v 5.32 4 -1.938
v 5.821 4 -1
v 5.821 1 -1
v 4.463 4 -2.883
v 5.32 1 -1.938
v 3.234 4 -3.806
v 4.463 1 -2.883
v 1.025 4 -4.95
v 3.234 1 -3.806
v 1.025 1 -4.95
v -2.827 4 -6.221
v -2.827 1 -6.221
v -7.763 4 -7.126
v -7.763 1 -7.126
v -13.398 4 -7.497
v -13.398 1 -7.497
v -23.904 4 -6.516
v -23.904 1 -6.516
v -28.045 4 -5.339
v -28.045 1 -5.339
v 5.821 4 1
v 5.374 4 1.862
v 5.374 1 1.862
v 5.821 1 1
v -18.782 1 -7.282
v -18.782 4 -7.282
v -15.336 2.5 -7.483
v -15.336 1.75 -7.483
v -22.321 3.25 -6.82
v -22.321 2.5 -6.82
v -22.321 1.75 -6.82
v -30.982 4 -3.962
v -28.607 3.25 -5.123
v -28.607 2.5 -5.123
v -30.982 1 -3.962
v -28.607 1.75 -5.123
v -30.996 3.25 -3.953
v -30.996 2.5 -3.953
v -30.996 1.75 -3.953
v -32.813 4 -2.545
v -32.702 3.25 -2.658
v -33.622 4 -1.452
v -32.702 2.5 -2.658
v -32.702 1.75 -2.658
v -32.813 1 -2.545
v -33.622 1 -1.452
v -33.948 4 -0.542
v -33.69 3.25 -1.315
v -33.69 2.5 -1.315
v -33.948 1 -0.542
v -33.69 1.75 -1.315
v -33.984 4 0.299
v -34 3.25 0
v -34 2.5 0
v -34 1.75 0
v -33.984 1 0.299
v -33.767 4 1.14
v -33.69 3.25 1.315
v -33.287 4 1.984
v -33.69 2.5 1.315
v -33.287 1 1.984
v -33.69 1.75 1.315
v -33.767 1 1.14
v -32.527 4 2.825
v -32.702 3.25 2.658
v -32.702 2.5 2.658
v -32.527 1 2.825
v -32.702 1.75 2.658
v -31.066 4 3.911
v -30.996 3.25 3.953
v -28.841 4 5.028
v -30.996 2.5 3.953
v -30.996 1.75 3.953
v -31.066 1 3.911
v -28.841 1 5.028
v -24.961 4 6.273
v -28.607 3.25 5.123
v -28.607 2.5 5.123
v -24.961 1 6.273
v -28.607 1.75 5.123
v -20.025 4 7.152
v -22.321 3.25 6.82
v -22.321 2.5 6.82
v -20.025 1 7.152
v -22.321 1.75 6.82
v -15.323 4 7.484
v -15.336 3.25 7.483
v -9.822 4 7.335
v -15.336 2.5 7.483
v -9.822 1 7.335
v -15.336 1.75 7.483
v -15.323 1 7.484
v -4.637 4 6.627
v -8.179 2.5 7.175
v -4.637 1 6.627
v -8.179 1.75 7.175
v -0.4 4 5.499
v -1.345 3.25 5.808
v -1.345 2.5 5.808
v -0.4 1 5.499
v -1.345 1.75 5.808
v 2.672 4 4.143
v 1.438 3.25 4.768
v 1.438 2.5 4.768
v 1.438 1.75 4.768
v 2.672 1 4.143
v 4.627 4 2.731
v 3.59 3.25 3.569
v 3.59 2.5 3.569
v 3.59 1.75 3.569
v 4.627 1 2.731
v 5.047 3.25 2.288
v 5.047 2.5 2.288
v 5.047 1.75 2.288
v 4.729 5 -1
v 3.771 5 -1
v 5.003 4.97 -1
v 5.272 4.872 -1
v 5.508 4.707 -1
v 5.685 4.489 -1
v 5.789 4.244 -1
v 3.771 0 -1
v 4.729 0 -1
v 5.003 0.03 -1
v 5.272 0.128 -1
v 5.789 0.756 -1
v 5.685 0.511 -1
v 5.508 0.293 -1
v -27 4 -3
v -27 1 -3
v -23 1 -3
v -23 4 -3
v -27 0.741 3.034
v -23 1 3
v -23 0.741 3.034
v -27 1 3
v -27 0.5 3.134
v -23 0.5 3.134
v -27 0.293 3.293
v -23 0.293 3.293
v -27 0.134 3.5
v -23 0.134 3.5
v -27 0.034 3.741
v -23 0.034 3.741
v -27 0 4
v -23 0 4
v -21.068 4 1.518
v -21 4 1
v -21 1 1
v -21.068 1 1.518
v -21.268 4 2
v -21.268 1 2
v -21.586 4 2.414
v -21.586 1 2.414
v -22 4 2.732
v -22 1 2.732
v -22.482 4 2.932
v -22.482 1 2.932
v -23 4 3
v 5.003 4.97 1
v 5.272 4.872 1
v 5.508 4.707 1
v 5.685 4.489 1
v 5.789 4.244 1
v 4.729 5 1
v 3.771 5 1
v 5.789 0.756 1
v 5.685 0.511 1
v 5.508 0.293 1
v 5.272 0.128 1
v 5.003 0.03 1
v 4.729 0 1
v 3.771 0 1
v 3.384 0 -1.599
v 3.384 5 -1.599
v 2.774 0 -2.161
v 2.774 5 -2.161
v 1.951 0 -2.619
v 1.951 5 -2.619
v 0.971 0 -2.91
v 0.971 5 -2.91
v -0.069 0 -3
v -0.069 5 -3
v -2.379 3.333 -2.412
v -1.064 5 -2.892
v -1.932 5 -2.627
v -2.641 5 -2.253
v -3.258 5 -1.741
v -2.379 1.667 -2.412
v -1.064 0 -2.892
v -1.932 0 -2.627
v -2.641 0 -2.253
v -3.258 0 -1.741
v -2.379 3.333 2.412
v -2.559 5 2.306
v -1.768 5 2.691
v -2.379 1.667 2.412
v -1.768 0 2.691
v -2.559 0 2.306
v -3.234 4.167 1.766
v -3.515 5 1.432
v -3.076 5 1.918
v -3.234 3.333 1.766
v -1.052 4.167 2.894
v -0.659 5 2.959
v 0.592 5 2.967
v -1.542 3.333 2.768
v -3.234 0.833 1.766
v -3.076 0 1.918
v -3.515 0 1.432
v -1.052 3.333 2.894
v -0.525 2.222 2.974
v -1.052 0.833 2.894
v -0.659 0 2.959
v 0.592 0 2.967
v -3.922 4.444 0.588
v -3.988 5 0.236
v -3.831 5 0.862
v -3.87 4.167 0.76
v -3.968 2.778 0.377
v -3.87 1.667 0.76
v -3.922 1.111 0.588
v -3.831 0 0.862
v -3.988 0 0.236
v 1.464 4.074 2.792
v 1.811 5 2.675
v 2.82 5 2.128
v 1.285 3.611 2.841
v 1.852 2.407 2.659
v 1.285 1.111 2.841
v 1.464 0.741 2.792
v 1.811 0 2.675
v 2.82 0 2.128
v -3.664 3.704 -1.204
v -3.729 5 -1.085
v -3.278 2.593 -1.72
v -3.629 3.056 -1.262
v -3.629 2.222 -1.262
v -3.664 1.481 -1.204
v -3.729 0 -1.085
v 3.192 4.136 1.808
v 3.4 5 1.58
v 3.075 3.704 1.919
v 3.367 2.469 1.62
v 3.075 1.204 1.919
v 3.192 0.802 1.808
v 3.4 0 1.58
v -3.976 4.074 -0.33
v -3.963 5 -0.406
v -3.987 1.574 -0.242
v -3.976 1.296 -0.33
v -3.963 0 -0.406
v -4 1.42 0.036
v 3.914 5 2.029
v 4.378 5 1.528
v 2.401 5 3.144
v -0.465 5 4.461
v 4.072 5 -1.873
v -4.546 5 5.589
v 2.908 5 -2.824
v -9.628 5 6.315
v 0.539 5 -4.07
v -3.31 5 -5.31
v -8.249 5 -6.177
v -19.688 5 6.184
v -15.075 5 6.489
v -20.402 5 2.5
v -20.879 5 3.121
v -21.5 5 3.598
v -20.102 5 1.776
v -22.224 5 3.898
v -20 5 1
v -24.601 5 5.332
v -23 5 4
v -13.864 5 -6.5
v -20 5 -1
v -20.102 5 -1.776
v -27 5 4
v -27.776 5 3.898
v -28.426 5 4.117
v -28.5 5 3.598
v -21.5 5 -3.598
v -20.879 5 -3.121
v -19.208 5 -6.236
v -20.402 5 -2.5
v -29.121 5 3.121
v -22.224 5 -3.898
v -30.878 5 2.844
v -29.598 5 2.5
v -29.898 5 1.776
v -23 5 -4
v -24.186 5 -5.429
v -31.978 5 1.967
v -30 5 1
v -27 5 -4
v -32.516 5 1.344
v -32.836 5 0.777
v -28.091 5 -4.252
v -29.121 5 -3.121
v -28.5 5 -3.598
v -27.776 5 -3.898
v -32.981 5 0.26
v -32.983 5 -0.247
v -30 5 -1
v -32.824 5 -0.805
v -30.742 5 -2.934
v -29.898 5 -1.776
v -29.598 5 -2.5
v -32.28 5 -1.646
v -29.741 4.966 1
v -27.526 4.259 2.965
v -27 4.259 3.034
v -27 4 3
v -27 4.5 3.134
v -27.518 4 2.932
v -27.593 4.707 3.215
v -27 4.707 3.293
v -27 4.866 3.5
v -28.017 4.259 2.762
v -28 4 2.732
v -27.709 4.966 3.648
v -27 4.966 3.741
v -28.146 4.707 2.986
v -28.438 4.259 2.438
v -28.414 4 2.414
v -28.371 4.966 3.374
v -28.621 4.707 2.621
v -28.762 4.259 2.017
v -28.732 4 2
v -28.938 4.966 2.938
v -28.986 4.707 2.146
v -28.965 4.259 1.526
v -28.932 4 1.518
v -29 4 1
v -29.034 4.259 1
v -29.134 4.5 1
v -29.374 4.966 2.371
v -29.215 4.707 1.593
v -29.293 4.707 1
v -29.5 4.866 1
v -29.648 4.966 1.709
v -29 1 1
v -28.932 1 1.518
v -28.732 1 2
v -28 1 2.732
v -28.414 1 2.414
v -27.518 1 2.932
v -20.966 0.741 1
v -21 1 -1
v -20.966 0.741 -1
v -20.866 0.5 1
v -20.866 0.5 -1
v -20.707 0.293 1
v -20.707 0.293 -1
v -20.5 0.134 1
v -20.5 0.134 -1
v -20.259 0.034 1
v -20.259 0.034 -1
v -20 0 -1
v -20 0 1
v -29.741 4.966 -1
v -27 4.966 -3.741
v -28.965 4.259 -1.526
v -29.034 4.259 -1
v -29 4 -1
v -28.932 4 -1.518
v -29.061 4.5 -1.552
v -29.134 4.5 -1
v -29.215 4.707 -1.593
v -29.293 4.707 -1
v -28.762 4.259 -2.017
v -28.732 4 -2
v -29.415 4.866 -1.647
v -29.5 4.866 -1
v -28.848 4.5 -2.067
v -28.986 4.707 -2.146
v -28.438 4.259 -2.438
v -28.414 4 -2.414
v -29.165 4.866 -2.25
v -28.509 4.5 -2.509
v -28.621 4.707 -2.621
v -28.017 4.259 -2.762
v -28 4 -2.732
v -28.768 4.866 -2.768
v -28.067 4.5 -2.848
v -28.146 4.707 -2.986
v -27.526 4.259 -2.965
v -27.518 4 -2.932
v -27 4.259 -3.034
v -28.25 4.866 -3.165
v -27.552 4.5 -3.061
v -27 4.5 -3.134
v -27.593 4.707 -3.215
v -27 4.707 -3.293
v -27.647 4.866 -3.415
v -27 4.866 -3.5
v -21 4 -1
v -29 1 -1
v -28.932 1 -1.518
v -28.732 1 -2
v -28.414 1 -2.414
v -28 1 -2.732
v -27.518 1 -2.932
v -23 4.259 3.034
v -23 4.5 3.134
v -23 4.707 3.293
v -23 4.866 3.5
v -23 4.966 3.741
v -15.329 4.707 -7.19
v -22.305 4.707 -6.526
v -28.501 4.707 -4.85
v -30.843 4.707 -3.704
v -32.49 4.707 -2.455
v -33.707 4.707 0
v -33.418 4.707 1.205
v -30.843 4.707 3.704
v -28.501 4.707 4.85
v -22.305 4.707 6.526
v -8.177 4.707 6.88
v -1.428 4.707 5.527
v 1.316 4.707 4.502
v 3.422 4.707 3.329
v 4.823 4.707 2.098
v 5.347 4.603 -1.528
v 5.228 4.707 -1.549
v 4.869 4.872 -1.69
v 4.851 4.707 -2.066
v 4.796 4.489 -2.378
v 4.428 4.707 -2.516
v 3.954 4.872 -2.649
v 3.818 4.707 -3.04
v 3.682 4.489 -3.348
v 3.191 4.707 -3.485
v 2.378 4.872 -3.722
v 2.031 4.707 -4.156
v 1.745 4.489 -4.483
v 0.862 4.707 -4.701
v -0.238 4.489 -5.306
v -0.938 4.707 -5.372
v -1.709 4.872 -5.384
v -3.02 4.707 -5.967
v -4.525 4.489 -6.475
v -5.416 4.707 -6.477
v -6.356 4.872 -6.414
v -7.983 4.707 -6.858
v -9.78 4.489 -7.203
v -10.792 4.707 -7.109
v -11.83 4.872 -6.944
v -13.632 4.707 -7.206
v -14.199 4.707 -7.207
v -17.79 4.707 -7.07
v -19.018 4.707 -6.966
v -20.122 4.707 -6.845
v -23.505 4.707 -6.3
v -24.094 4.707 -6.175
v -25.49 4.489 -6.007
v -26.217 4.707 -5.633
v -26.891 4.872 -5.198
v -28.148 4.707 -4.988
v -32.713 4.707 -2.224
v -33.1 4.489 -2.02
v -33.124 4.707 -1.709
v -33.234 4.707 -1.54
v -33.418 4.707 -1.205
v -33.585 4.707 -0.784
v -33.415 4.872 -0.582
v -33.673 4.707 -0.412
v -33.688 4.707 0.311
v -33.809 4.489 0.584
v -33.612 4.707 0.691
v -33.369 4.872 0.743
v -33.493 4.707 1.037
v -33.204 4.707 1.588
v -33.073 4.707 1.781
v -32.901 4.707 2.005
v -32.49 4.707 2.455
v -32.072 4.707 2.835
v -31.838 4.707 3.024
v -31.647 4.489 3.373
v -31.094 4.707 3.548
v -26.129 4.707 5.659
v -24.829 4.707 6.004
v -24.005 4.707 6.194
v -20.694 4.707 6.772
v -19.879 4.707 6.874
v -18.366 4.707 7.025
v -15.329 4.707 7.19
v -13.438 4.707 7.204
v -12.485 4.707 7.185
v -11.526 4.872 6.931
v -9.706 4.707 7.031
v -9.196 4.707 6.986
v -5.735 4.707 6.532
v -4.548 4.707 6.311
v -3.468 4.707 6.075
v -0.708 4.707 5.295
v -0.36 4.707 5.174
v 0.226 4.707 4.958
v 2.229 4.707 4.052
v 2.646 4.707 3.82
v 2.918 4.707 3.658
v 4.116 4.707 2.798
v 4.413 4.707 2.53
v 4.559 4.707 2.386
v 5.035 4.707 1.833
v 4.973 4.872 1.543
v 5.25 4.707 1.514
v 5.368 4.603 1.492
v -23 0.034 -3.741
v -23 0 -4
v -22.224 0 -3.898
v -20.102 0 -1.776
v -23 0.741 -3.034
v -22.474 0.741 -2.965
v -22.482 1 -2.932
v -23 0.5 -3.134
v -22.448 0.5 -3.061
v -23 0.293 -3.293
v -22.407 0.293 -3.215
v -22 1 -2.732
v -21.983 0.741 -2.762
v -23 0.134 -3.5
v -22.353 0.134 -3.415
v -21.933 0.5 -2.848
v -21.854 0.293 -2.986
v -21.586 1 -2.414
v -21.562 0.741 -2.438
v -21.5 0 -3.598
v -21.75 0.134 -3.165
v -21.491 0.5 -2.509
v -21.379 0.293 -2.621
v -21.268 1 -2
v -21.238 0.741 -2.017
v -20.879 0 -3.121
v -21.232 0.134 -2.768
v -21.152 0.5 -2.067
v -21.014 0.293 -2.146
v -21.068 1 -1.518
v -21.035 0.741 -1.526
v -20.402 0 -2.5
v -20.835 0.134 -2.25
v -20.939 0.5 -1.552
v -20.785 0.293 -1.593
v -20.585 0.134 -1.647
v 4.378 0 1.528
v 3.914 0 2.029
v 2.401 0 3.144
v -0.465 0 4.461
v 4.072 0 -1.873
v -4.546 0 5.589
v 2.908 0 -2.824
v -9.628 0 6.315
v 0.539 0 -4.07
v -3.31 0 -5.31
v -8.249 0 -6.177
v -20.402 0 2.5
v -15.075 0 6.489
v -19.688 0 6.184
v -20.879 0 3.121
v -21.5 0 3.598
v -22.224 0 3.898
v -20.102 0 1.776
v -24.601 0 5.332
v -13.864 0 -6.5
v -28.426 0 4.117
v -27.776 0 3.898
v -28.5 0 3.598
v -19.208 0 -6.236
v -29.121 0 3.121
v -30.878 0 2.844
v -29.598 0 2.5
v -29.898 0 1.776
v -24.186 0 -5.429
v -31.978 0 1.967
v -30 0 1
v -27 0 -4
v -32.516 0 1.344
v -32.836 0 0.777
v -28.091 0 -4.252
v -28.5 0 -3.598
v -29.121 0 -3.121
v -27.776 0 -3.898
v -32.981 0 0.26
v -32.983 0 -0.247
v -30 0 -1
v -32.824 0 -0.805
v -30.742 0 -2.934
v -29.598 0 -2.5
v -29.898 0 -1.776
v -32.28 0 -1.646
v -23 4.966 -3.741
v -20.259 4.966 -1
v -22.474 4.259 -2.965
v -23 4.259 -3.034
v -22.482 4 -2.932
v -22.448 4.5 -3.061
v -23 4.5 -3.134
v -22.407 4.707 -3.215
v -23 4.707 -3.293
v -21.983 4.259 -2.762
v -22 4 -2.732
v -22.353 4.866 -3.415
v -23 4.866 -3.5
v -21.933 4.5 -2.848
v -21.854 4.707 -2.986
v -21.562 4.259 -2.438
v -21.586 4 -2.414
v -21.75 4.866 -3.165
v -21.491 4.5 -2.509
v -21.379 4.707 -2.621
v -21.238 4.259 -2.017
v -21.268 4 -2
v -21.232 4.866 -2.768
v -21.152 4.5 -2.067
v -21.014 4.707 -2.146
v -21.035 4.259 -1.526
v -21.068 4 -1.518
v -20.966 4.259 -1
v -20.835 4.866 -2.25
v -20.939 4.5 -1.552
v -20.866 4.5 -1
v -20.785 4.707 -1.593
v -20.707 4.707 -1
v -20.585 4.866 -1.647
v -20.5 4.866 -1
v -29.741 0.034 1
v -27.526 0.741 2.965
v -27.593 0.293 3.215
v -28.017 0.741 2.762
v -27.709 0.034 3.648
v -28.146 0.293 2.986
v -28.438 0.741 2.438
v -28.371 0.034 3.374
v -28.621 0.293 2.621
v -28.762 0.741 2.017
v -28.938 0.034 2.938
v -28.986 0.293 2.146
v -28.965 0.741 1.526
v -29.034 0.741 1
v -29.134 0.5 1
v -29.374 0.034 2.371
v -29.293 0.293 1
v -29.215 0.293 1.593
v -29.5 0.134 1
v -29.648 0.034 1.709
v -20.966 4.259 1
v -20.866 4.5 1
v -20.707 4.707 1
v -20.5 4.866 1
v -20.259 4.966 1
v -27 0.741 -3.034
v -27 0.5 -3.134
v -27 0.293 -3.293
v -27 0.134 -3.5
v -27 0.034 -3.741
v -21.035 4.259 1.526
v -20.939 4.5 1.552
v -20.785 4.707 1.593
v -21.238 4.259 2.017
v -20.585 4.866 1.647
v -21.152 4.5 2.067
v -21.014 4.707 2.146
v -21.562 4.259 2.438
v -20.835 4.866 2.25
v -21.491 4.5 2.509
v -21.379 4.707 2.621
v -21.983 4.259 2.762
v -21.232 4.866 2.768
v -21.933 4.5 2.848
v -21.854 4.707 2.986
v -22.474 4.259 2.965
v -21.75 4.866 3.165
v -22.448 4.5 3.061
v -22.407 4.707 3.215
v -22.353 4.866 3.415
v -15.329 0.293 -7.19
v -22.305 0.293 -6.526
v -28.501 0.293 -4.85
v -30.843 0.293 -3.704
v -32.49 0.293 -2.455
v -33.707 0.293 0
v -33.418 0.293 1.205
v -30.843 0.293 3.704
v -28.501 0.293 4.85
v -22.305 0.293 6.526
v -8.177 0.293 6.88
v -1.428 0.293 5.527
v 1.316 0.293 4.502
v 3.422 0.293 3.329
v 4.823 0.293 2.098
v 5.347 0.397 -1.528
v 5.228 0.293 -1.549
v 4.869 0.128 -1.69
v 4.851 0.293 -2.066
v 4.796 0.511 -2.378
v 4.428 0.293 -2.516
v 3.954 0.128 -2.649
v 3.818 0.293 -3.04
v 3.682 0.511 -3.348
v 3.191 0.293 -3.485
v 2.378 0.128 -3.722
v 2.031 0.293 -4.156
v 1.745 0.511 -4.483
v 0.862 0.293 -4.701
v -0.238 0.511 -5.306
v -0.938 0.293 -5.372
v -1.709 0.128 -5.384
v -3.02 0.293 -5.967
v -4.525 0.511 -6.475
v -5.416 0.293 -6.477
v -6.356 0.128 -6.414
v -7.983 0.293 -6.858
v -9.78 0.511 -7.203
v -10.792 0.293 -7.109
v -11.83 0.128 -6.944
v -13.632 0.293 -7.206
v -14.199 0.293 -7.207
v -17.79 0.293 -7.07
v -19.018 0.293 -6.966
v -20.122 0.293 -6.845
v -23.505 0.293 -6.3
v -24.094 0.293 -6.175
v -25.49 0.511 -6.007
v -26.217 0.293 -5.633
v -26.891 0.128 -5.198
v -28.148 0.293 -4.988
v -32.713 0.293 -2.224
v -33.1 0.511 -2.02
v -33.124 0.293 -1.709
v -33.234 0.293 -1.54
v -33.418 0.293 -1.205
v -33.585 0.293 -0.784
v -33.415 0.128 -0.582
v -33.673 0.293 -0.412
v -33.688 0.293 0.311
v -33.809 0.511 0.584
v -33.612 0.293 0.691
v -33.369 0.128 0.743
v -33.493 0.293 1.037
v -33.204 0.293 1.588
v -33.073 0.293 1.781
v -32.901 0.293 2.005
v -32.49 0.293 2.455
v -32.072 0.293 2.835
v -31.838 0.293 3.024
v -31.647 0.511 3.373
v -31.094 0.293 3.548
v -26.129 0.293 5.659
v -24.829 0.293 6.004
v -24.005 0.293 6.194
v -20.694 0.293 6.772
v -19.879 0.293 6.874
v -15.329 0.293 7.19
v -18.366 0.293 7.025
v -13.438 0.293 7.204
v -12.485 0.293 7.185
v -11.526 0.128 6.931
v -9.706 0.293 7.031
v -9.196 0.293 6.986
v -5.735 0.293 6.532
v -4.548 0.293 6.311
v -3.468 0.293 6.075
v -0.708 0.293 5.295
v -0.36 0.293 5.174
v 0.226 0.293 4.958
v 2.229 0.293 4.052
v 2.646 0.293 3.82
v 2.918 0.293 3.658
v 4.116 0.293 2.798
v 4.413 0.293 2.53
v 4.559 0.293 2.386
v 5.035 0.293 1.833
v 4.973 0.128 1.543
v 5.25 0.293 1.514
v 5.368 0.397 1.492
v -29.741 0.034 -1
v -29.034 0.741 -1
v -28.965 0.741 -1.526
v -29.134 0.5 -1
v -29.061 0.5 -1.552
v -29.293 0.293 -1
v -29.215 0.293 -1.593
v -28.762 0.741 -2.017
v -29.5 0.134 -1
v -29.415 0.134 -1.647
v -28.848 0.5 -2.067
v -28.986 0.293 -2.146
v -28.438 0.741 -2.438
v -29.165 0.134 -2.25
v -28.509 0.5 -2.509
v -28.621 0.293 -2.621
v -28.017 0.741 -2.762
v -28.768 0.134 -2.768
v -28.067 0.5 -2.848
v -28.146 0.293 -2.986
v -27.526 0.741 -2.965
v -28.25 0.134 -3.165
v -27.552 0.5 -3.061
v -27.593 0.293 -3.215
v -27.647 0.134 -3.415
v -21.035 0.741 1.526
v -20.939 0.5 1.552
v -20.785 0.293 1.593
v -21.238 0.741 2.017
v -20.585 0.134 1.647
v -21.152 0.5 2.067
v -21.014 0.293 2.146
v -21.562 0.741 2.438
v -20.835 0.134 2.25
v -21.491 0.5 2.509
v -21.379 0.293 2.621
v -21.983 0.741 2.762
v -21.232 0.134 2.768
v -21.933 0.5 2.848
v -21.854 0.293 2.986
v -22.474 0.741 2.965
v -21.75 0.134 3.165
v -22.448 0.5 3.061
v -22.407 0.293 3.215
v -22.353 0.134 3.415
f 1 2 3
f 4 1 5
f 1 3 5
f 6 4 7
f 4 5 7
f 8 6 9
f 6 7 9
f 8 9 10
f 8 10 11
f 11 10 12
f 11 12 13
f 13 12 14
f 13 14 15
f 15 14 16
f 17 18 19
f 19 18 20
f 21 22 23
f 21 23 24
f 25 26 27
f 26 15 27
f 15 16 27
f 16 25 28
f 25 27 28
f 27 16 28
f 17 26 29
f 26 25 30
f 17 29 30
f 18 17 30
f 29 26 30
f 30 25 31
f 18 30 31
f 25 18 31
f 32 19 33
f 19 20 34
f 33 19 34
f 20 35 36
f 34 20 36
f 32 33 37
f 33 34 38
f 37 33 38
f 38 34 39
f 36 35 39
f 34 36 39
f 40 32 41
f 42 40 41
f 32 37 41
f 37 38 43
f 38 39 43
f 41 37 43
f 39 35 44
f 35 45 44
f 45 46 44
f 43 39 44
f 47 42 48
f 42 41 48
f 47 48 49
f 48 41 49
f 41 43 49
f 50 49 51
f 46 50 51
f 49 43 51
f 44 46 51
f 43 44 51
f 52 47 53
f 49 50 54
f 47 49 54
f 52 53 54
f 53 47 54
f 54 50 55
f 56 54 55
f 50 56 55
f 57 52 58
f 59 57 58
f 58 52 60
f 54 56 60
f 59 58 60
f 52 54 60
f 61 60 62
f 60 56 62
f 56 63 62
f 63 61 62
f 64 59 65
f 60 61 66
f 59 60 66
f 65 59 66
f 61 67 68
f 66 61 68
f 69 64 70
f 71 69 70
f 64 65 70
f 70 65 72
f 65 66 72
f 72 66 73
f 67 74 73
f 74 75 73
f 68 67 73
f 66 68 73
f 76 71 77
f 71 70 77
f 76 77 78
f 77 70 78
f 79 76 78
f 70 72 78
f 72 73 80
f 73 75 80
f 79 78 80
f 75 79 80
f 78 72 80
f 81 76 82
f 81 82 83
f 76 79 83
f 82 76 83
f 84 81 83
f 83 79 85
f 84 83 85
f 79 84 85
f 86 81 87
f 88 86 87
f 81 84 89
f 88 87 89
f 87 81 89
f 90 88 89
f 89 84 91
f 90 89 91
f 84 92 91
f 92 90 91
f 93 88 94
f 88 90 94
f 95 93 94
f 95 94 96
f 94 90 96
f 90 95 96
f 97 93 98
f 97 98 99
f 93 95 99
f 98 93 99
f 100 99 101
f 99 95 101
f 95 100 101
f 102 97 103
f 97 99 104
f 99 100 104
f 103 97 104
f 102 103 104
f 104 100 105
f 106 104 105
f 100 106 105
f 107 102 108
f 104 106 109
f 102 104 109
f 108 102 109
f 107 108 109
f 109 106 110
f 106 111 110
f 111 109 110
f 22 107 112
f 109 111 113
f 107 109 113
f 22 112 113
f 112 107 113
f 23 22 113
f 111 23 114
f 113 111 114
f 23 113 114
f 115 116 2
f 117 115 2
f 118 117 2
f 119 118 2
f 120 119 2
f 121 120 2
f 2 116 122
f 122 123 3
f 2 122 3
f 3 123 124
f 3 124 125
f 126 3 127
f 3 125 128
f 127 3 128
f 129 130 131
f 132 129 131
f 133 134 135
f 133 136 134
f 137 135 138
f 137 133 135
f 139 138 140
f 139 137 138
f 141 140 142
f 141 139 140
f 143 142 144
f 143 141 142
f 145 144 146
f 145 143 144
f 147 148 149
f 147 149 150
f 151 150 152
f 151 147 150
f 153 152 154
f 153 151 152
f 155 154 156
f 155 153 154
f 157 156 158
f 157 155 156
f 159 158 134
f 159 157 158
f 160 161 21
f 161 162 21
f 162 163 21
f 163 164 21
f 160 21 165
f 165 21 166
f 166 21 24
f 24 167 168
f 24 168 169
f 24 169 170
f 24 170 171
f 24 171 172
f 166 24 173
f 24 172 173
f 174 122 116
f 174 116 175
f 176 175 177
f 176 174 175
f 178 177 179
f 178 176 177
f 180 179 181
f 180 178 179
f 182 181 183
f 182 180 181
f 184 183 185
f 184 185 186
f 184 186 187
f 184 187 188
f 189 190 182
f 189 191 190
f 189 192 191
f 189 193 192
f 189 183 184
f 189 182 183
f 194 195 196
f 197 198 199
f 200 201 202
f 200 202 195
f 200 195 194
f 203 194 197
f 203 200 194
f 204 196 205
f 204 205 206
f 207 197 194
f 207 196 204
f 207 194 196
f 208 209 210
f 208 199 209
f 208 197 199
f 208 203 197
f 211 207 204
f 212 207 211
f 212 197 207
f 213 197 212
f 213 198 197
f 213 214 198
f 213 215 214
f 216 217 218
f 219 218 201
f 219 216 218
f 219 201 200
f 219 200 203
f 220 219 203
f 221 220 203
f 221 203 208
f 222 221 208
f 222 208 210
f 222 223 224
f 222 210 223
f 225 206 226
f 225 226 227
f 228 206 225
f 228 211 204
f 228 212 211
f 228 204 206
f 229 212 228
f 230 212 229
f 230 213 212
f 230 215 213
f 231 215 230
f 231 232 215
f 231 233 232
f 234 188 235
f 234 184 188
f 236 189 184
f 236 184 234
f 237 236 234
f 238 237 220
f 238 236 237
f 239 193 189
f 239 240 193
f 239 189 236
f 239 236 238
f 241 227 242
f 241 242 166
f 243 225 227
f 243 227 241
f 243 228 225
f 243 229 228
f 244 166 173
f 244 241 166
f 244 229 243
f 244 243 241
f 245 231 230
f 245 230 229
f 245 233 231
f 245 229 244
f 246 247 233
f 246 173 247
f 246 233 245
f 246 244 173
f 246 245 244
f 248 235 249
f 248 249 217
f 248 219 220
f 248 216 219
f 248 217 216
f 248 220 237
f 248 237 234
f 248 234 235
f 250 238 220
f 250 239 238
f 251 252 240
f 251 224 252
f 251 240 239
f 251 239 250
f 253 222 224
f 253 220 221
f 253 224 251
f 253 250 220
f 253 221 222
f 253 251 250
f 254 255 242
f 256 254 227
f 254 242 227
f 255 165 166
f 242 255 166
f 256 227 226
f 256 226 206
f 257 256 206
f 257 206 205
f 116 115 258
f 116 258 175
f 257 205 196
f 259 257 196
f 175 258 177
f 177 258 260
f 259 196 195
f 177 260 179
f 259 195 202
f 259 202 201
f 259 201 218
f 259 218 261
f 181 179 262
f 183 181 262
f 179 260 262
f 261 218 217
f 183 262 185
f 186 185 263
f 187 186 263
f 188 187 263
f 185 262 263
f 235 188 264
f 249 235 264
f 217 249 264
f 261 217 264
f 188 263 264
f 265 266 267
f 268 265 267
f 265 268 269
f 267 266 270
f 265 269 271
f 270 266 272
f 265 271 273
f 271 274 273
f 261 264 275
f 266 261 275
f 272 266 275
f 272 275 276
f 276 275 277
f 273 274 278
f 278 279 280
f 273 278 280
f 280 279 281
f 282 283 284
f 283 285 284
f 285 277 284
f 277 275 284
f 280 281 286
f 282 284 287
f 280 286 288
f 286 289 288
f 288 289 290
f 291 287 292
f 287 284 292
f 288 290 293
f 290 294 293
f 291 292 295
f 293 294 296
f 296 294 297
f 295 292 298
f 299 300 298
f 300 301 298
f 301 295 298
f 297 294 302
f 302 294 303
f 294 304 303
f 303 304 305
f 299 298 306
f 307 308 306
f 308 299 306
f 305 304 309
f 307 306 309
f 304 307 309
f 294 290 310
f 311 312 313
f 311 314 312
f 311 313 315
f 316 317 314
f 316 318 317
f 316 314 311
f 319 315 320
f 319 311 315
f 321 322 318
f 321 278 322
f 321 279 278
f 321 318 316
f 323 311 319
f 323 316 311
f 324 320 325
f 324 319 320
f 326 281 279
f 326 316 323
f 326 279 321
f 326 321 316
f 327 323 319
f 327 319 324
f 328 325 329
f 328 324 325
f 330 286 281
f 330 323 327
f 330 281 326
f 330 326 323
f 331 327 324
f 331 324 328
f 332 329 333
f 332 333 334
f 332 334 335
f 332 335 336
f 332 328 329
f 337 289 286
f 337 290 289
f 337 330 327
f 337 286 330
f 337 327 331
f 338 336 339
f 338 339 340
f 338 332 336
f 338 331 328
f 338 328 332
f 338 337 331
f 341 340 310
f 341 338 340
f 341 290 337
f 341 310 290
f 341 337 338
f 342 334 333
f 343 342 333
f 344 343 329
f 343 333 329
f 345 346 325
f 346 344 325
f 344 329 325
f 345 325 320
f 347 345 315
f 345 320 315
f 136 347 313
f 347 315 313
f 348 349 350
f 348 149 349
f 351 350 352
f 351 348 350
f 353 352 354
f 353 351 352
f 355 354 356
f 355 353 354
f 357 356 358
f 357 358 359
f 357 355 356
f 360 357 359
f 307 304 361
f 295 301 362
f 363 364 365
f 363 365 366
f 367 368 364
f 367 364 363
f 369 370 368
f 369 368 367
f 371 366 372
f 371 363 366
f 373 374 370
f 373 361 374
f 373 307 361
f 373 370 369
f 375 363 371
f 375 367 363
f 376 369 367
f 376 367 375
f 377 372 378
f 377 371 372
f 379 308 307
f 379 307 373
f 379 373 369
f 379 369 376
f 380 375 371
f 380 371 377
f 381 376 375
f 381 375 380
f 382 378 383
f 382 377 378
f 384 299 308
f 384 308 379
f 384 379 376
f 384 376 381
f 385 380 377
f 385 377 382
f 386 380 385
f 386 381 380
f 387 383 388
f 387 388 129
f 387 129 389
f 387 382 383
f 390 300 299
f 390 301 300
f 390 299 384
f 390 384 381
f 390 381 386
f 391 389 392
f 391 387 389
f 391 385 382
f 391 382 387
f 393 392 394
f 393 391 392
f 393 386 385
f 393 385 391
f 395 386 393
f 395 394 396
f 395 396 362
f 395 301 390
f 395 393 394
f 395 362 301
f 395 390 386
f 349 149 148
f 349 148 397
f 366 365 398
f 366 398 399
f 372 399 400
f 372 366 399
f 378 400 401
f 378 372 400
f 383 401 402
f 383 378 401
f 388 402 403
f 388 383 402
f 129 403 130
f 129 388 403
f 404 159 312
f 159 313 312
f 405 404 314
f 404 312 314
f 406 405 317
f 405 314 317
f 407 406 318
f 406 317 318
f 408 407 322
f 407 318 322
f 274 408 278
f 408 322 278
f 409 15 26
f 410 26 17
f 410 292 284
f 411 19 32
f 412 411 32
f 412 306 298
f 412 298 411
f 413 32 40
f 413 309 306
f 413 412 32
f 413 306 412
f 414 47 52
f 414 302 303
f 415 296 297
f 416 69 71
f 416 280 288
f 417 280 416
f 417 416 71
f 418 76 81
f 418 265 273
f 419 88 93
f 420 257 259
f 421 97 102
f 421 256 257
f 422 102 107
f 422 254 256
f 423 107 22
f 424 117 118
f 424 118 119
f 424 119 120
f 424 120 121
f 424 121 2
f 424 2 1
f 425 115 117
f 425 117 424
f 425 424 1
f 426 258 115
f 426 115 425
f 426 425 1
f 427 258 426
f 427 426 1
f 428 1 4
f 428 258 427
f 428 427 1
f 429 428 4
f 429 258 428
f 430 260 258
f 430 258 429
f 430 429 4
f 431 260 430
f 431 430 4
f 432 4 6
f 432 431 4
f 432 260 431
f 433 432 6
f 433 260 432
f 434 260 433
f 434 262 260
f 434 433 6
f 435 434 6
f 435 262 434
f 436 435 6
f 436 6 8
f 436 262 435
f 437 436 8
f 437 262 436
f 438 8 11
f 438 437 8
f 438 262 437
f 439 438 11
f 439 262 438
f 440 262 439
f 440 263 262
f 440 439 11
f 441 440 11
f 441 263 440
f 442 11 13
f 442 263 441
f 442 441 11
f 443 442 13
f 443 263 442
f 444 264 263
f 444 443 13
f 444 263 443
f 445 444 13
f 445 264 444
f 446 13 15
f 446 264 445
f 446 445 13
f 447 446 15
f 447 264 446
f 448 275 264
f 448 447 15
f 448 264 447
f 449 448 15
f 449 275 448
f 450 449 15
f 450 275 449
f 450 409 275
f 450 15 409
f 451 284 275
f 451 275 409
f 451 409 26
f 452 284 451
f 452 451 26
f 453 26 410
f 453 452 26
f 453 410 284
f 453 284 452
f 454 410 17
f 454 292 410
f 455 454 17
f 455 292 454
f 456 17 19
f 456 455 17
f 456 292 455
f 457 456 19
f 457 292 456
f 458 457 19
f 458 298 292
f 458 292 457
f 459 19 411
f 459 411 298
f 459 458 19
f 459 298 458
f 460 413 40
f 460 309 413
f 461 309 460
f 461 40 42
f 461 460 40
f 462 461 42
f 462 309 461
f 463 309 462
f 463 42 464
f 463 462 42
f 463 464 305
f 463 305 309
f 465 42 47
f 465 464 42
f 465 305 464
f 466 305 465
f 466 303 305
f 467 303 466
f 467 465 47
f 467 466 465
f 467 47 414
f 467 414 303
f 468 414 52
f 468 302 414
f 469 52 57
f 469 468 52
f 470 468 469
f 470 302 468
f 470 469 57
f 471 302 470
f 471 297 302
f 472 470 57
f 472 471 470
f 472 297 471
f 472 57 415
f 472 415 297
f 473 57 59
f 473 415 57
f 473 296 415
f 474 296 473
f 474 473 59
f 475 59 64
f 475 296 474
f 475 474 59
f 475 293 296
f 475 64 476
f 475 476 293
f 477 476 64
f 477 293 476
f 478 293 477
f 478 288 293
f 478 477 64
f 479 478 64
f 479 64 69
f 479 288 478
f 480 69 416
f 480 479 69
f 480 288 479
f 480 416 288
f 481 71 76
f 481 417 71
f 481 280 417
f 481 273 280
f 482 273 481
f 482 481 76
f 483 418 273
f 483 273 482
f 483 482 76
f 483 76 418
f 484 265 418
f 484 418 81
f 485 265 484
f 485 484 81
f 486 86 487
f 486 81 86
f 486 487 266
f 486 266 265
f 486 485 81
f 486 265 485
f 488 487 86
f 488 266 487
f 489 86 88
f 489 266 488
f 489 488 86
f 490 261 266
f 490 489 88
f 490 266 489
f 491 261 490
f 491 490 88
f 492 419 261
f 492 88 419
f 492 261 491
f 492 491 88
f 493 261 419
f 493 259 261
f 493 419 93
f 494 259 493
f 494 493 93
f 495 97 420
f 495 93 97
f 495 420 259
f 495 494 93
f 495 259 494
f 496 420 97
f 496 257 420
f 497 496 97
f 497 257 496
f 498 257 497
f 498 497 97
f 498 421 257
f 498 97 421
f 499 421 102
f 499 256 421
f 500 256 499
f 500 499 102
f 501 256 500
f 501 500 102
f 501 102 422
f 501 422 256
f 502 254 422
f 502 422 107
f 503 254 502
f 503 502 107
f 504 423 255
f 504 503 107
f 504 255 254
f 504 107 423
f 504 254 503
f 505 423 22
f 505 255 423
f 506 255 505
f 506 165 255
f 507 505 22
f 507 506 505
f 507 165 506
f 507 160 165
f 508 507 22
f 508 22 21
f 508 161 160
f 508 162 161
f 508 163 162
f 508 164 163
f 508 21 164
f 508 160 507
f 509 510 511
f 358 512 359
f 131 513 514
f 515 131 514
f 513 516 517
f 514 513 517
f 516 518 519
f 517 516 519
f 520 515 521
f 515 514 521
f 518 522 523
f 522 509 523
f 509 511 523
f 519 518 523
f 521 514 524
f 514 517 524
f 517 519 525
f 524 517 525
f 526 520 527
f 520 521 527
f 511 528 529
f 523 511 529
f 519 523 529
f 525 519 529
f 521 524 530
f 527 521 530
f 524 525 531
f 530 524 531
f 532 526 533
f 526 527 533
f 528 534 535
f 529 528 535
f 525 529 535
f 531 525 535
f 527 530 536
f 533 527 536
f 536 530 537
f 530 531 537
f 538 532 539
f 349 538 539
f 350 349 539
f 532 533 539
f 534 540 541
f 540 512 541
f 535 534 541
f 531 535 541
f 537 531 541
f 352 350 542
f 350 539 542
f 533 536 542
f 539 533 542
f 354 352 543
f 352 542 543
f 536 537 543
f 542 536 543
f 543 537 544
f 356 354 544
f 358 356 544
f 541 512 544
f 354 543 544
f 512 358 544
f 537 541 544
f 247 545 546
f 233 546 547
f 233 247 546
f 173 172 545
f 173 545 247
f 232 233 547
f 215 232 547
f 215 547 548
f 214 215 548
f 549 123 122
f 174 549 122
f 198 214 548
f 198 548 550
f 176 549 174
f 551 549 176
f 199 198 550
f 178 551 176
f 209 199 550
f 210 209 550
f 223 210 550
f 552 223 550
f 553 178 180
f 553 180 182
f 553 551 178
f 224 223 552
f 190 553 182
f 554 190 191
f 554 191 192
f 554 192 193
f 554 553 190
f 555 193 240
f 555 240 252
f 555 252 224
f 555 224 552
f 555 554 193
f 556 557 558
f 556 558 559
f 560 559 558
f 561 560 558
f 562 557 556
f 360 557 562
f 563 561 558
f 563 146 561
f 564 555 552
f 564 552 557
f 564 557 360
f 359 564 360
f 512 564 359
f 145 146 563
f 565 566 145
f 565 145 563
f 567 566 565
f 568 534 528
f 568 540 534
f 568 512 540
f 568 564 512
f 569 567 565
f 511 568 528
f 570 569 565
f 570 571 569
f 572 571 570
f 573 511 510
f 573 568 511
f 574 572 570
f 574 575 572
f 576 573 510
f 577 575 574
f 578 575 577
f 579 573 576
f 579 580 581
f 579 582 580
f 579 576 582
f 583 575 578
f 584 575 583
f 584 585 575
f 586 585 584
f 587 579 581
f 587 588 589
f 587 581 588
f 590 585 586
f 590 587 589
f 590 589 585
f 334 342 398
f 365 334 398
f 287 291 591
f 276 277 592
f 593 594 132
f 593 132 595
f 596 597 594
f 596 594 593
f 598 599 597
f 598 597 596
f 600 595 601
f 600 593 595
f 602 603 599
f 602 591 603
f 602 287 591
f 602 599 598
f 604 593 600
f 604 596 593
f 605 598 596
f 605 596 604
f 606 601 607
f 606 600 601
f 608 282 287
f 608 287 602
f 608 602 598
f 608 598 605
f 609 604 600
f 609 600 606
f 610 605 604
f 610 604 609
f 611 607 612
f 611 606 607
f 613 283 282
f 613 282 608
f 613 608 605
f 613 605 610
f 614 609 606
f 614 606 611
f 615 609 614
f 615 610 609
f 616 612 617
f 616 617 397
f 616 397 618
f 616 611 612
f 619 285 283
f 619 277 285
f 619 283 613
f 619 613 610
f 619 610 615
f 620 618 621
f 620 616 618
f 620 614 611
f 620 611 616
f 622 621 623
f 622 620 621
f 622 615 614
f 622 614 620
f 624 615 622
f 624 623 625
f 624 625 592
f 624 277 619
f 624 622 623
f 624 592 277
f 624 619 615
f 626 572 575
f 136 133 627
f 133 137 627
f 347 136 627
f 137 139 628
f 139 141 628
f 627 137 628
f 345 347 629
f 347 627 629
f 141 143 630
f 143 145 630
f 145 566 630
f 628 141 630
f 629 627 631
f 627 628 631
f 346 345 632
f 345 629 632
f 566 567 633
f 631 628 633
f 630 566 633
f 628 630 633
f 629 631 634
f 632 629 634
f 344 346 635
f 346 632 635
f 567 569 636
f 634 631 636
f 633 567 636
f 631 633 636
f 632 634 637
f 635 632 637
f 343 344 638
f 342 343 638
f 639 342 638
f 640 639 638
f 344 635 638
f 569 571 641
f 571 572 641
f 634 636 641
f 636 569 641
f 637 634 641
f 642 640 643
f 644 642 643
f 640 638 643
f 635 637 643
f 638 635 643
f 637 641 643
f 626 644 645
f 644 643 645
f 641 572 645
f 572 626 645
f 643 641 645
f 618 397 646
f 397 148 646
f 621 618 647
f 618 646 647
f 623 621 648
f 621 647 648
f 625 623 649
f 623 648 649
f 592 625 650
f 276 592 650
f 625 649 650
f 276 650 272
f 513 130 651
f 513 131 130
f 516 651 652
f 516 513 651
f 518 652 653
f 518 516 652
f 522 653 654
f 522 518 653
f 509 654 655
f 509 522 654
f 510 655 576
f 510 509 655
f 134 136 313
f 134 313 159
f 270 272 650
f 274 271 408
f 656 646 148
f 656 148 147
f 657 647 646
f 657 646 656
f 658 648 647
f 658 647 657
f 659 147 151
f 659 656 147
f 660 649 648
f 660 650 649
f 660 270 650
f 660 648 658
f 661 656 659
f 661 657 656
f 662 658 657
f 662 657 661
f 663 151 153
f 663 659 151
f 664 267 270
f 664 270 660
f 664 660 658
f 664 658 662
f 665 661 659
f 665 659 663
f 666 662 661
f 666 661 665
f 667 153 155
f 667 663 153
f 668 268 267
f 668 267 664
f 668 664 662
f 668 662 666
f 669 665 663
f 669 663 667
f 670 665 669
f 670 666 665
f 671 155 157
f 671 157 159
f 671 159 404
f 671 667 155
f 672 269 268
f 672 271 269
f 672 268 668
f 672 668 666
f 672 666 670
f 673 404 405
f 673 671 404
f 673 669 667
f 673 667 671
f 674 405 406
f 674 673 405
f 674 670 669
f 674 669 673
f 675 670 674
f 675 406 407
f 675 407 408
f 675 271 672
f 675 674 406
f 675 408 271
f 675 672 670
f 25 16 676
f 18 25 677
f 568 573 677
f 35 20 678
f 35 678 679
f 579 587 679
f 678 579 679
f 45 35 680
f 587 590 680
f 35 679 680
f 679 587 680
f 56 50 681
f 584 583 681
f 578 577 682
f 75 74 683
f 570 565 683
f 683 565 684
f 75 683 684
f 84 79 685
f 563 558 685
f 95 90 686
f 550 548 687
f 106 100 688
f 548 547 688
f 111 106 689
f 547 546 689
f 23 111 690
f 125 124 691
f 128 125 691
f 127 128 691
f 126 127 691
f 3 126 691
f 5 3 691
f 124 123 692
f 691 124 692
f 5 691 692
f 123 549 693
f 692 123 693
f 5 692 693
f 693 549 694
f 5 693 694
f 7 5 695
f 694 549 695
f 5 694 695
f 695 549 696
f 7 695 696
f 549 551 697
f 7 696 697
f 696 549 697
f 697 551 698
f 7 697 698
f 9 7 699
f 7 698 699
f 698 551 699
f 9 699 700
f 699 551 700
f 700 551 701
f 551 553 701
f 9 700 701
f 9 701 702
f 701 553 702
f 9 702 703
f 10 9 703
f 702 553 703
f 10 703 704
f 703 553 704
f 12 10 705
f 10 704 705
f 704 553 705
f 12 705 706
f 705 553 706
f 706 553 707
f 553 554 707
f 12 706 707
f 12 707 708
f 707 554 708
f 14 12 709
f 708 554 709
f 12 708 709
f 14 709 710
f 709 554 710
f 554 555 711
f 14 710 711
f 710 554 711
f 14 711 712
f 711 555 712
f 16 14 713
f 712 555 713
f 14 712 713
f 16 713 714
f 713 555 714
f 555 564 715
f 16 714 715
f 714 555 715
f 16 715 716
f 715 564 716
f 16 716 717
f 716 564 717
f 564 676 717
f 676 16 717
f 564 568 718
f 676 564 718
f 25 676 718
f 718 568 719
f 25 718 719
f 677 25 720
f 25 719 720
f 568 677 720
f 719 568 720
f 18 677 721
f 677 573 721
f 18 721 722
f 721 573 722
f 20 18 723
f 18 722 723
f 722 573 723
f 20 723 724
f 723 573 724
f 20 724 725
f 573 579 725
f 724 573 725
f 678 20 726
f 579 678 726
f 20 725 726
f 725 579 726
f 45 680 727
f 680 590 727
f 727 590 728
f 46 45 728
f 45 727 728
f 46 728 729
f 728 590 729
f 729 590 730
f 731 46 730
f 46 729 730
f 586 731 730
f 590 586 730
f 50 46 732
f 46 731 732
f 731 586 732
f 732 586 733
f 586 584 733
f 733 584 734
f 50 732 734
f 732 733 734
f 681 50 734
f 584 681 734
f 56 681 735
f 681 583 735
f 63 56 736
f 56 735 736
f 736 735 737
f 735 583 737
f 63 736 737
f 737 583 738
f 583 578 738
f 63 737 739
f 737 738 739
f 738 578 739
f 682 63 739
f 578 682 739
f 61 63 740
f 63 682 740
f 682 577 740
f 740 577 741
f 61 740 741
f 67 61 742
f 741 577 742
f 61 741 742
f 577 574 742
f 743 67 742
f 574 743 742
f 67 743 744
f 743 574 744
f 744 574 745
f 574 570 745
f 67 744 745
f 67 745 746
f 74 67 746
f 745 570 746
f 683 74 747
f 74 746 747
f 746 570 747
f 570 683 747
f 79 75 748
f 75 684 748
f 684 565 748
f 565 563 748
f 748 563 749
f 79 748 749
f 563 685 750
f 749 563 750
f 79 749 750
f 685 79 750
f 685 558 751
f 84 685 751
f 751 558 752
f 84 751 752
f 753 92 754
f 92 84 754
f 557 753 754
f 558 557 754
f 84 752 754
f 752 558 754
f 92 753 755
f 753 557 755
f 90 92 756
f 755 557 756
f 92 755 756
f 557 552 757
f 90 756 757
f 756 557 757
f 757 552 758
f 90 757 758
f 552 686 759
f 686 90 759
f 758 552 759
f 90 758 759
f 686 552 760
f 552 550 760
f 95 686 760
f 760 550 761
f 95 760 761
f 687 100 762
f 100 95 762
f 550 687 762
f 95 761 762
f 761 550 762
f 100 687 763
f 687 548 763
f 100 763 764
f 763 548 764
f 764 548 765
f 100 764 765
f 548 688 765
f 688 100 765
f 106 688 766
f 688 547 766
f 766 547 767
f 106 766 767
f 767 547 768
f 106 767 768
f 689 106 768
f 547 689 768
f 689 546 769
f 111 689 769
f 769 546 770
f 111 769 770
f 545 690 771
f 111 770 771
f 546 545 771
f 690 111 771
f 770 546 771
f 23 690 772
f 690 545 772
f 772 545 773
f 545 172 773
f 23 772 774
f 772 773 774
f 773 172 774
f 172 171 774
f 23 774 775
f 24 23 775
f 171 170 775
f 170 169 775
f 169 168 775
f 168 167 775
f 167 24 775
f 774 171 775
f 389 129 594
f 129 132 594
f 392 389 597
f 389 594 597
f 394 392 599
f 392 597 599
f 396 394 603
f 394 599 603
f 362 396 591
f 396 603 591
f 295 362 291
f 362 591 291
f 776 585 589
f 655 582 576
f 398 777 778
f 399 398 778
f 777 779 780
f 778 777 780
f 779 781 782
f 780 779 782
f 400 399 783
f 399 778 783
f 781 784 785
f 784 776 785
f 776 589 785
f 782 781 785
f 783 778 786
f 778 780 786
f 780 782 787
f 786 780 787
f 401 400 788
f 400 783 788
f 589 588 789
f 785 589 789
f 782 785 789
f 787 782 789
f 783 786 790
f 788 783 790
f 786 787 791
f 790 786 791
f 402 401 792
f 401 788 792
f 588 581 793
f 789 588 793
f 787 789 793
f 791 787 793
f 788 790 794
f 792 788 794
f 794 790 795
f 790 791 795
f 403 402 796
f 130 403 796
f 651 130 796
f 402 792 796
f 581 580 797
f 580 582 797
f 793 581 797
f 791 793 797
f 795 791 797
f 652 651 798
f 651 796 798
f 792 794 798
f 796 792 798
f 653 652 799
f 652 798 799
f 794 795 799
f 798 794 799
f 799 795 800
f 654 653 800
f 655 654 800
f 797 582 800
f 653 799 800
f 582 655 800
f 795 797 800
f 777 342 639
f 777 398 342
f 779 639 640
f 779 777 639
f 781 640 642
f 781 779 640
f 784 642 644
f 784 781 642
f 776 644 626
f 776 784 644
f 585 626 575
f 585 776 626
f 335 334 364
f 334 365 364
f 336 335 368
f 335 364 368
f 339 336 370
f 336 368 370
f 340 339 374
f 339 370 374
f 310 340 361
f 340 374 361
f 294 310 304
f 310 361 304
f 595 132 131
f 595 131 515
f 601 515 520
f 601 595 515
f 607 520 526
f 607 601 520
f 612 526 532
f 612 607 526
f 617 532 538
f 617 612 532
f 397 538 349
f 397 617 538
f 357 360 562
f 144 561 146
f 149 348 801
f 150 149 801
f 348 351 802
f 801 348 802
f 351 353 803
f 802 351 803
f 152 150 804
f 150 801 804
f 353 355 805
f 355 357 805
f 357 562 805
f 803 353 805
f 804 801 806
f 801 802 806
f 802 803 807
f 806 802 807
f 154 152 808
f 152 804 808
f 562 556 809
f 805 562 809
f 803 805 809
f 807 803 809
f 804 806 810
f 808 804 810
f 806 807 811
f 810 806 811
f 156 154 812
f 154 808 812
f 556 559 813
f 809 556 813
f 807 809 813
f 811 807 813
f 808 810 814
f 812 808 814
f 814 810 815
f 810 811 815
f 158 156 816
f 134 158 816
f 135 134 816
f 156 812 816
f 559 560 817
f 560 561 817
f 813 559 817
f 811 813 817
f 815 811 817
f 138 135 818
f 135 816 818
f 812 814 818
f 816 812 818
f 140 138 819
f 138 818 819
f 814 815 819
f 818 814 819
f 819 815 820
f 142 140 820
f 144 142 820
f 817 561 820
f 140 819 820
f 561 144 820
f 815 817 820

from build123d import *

# Parameters (mm, degrees)
SKETCH_1_W      = 8
SKETCH_1_H      = 6
EXTRUDE_1_DEPTH = 5
FILLET_1_R      = 2
FILLET_2_R      = 1


with BuildPart() as part:
    # 草图1 → 凸台-拉伸1 (new body)
    with BuildSketch(Plane(origin=(0, 0, 0), x_dir=(1, 0, 0), z_dir=(0, 1, 0))):
        with BuildLine():
            add(Edge.make_bspline(
                [(3.771236166, 1), (1.968708481, 4.823738649), (-2.37875275, 2.411869324), (-6.72621398, 0), (-2.37875275, -2.411869324), (1.968708481, -4.823738649), (3.771236166, -1)],
                knots=[0.339836909, 0.339836909, 0.339836909, 2.207674072, 2.207674072, 4.075511235, 4.075511235, 5.943348398, 5.943348398, 5.943348398], degree=2, weights=[1, 0.594688187, 1, 0.594688187, 1, 0.594688187, 1]))
            Line((3.771236166, 1), (5.821424996, 1))
            add(Edge.make_bspline(
                [(5.821424996, 1), (3.327360828, 7.95192426), (-15.336319586, 7.483239867), (-34, 7.014555473), (-34, 0)],
                knots=[3.275324243, 3.275324243, 3.275324243, 4.779254775, 4.779254775, 6.283185307, 6.283185307, 6.283185307], degree=2, weights=[1, 0.730347855, 1, 0.730347855, 1]))
            add(Edge.make_bspline(
                [(-34, 0), (-34, -7.014555473), (-15.336319586, -7.483239867), (3.327360828, -7.95192426), (5.821424996, -1)],
                knots=[0, 0, 0, 1.503930532, 1.503930532, 3.007861064, 3.007861064, 3.007861064], degree=2, weights=[1, 0.730347855, 1, 0.730347855, 1]))
            Line((5.821424996, -1), (3.771236166, -1))
        make_face()
        with Locations((-25, 0)):
            Rectangle(SKETCH_1_W, SKETCH_1_H, mode=Mode.SUBTRACT)
    extrude(amount=EXTRUDE_1_DEPTH)

    # 圆角1
    fillet_1_edges = [part.edges().sort_by_distance(p)[0] for p in [
        (-21, 2.5, 3),
        (-21, 2.5, -3),
        (-29, 2.5, -3),
        (-29, 2.5, 3),
    ]]
    fillet(fillet_1_edges, radius=FILLET_1_R)

    # 圆角2
    fillet_2_edges = [part.edges().sort_by_distance(p)[0] for p in [
        (-14.510444937, 0, 7.497556908),
        (-29, 0, 0),
        (-29, 5, 0),
        (-25, 0, 3),
        (-25, 5, 3),
        (-21, 0, 0),
        (-21, 5, 0),
        (-25, 0, -3),
        (-25, 5, -3),
        (-14.510444937, 5, 7.497556908),
        (-28.414213562, 0, 2.414213562),
        (-28.414213562, 5, 2.414213562),
        (-21.585786438, 0, 2.414213562),
        (-21.585786438, 5, 2.414213562),
        (-21.585786438, 0, -2.414213562),
        (-21.585786438, 5, -2.414213562),
        (-28.414213562, 0, -2.414213562),
        (-28.414213562, 5, -2.414213562),
    ]]
    fillet(fillet_2_edges, radius=FILLET_2_R)


solid = part.part
